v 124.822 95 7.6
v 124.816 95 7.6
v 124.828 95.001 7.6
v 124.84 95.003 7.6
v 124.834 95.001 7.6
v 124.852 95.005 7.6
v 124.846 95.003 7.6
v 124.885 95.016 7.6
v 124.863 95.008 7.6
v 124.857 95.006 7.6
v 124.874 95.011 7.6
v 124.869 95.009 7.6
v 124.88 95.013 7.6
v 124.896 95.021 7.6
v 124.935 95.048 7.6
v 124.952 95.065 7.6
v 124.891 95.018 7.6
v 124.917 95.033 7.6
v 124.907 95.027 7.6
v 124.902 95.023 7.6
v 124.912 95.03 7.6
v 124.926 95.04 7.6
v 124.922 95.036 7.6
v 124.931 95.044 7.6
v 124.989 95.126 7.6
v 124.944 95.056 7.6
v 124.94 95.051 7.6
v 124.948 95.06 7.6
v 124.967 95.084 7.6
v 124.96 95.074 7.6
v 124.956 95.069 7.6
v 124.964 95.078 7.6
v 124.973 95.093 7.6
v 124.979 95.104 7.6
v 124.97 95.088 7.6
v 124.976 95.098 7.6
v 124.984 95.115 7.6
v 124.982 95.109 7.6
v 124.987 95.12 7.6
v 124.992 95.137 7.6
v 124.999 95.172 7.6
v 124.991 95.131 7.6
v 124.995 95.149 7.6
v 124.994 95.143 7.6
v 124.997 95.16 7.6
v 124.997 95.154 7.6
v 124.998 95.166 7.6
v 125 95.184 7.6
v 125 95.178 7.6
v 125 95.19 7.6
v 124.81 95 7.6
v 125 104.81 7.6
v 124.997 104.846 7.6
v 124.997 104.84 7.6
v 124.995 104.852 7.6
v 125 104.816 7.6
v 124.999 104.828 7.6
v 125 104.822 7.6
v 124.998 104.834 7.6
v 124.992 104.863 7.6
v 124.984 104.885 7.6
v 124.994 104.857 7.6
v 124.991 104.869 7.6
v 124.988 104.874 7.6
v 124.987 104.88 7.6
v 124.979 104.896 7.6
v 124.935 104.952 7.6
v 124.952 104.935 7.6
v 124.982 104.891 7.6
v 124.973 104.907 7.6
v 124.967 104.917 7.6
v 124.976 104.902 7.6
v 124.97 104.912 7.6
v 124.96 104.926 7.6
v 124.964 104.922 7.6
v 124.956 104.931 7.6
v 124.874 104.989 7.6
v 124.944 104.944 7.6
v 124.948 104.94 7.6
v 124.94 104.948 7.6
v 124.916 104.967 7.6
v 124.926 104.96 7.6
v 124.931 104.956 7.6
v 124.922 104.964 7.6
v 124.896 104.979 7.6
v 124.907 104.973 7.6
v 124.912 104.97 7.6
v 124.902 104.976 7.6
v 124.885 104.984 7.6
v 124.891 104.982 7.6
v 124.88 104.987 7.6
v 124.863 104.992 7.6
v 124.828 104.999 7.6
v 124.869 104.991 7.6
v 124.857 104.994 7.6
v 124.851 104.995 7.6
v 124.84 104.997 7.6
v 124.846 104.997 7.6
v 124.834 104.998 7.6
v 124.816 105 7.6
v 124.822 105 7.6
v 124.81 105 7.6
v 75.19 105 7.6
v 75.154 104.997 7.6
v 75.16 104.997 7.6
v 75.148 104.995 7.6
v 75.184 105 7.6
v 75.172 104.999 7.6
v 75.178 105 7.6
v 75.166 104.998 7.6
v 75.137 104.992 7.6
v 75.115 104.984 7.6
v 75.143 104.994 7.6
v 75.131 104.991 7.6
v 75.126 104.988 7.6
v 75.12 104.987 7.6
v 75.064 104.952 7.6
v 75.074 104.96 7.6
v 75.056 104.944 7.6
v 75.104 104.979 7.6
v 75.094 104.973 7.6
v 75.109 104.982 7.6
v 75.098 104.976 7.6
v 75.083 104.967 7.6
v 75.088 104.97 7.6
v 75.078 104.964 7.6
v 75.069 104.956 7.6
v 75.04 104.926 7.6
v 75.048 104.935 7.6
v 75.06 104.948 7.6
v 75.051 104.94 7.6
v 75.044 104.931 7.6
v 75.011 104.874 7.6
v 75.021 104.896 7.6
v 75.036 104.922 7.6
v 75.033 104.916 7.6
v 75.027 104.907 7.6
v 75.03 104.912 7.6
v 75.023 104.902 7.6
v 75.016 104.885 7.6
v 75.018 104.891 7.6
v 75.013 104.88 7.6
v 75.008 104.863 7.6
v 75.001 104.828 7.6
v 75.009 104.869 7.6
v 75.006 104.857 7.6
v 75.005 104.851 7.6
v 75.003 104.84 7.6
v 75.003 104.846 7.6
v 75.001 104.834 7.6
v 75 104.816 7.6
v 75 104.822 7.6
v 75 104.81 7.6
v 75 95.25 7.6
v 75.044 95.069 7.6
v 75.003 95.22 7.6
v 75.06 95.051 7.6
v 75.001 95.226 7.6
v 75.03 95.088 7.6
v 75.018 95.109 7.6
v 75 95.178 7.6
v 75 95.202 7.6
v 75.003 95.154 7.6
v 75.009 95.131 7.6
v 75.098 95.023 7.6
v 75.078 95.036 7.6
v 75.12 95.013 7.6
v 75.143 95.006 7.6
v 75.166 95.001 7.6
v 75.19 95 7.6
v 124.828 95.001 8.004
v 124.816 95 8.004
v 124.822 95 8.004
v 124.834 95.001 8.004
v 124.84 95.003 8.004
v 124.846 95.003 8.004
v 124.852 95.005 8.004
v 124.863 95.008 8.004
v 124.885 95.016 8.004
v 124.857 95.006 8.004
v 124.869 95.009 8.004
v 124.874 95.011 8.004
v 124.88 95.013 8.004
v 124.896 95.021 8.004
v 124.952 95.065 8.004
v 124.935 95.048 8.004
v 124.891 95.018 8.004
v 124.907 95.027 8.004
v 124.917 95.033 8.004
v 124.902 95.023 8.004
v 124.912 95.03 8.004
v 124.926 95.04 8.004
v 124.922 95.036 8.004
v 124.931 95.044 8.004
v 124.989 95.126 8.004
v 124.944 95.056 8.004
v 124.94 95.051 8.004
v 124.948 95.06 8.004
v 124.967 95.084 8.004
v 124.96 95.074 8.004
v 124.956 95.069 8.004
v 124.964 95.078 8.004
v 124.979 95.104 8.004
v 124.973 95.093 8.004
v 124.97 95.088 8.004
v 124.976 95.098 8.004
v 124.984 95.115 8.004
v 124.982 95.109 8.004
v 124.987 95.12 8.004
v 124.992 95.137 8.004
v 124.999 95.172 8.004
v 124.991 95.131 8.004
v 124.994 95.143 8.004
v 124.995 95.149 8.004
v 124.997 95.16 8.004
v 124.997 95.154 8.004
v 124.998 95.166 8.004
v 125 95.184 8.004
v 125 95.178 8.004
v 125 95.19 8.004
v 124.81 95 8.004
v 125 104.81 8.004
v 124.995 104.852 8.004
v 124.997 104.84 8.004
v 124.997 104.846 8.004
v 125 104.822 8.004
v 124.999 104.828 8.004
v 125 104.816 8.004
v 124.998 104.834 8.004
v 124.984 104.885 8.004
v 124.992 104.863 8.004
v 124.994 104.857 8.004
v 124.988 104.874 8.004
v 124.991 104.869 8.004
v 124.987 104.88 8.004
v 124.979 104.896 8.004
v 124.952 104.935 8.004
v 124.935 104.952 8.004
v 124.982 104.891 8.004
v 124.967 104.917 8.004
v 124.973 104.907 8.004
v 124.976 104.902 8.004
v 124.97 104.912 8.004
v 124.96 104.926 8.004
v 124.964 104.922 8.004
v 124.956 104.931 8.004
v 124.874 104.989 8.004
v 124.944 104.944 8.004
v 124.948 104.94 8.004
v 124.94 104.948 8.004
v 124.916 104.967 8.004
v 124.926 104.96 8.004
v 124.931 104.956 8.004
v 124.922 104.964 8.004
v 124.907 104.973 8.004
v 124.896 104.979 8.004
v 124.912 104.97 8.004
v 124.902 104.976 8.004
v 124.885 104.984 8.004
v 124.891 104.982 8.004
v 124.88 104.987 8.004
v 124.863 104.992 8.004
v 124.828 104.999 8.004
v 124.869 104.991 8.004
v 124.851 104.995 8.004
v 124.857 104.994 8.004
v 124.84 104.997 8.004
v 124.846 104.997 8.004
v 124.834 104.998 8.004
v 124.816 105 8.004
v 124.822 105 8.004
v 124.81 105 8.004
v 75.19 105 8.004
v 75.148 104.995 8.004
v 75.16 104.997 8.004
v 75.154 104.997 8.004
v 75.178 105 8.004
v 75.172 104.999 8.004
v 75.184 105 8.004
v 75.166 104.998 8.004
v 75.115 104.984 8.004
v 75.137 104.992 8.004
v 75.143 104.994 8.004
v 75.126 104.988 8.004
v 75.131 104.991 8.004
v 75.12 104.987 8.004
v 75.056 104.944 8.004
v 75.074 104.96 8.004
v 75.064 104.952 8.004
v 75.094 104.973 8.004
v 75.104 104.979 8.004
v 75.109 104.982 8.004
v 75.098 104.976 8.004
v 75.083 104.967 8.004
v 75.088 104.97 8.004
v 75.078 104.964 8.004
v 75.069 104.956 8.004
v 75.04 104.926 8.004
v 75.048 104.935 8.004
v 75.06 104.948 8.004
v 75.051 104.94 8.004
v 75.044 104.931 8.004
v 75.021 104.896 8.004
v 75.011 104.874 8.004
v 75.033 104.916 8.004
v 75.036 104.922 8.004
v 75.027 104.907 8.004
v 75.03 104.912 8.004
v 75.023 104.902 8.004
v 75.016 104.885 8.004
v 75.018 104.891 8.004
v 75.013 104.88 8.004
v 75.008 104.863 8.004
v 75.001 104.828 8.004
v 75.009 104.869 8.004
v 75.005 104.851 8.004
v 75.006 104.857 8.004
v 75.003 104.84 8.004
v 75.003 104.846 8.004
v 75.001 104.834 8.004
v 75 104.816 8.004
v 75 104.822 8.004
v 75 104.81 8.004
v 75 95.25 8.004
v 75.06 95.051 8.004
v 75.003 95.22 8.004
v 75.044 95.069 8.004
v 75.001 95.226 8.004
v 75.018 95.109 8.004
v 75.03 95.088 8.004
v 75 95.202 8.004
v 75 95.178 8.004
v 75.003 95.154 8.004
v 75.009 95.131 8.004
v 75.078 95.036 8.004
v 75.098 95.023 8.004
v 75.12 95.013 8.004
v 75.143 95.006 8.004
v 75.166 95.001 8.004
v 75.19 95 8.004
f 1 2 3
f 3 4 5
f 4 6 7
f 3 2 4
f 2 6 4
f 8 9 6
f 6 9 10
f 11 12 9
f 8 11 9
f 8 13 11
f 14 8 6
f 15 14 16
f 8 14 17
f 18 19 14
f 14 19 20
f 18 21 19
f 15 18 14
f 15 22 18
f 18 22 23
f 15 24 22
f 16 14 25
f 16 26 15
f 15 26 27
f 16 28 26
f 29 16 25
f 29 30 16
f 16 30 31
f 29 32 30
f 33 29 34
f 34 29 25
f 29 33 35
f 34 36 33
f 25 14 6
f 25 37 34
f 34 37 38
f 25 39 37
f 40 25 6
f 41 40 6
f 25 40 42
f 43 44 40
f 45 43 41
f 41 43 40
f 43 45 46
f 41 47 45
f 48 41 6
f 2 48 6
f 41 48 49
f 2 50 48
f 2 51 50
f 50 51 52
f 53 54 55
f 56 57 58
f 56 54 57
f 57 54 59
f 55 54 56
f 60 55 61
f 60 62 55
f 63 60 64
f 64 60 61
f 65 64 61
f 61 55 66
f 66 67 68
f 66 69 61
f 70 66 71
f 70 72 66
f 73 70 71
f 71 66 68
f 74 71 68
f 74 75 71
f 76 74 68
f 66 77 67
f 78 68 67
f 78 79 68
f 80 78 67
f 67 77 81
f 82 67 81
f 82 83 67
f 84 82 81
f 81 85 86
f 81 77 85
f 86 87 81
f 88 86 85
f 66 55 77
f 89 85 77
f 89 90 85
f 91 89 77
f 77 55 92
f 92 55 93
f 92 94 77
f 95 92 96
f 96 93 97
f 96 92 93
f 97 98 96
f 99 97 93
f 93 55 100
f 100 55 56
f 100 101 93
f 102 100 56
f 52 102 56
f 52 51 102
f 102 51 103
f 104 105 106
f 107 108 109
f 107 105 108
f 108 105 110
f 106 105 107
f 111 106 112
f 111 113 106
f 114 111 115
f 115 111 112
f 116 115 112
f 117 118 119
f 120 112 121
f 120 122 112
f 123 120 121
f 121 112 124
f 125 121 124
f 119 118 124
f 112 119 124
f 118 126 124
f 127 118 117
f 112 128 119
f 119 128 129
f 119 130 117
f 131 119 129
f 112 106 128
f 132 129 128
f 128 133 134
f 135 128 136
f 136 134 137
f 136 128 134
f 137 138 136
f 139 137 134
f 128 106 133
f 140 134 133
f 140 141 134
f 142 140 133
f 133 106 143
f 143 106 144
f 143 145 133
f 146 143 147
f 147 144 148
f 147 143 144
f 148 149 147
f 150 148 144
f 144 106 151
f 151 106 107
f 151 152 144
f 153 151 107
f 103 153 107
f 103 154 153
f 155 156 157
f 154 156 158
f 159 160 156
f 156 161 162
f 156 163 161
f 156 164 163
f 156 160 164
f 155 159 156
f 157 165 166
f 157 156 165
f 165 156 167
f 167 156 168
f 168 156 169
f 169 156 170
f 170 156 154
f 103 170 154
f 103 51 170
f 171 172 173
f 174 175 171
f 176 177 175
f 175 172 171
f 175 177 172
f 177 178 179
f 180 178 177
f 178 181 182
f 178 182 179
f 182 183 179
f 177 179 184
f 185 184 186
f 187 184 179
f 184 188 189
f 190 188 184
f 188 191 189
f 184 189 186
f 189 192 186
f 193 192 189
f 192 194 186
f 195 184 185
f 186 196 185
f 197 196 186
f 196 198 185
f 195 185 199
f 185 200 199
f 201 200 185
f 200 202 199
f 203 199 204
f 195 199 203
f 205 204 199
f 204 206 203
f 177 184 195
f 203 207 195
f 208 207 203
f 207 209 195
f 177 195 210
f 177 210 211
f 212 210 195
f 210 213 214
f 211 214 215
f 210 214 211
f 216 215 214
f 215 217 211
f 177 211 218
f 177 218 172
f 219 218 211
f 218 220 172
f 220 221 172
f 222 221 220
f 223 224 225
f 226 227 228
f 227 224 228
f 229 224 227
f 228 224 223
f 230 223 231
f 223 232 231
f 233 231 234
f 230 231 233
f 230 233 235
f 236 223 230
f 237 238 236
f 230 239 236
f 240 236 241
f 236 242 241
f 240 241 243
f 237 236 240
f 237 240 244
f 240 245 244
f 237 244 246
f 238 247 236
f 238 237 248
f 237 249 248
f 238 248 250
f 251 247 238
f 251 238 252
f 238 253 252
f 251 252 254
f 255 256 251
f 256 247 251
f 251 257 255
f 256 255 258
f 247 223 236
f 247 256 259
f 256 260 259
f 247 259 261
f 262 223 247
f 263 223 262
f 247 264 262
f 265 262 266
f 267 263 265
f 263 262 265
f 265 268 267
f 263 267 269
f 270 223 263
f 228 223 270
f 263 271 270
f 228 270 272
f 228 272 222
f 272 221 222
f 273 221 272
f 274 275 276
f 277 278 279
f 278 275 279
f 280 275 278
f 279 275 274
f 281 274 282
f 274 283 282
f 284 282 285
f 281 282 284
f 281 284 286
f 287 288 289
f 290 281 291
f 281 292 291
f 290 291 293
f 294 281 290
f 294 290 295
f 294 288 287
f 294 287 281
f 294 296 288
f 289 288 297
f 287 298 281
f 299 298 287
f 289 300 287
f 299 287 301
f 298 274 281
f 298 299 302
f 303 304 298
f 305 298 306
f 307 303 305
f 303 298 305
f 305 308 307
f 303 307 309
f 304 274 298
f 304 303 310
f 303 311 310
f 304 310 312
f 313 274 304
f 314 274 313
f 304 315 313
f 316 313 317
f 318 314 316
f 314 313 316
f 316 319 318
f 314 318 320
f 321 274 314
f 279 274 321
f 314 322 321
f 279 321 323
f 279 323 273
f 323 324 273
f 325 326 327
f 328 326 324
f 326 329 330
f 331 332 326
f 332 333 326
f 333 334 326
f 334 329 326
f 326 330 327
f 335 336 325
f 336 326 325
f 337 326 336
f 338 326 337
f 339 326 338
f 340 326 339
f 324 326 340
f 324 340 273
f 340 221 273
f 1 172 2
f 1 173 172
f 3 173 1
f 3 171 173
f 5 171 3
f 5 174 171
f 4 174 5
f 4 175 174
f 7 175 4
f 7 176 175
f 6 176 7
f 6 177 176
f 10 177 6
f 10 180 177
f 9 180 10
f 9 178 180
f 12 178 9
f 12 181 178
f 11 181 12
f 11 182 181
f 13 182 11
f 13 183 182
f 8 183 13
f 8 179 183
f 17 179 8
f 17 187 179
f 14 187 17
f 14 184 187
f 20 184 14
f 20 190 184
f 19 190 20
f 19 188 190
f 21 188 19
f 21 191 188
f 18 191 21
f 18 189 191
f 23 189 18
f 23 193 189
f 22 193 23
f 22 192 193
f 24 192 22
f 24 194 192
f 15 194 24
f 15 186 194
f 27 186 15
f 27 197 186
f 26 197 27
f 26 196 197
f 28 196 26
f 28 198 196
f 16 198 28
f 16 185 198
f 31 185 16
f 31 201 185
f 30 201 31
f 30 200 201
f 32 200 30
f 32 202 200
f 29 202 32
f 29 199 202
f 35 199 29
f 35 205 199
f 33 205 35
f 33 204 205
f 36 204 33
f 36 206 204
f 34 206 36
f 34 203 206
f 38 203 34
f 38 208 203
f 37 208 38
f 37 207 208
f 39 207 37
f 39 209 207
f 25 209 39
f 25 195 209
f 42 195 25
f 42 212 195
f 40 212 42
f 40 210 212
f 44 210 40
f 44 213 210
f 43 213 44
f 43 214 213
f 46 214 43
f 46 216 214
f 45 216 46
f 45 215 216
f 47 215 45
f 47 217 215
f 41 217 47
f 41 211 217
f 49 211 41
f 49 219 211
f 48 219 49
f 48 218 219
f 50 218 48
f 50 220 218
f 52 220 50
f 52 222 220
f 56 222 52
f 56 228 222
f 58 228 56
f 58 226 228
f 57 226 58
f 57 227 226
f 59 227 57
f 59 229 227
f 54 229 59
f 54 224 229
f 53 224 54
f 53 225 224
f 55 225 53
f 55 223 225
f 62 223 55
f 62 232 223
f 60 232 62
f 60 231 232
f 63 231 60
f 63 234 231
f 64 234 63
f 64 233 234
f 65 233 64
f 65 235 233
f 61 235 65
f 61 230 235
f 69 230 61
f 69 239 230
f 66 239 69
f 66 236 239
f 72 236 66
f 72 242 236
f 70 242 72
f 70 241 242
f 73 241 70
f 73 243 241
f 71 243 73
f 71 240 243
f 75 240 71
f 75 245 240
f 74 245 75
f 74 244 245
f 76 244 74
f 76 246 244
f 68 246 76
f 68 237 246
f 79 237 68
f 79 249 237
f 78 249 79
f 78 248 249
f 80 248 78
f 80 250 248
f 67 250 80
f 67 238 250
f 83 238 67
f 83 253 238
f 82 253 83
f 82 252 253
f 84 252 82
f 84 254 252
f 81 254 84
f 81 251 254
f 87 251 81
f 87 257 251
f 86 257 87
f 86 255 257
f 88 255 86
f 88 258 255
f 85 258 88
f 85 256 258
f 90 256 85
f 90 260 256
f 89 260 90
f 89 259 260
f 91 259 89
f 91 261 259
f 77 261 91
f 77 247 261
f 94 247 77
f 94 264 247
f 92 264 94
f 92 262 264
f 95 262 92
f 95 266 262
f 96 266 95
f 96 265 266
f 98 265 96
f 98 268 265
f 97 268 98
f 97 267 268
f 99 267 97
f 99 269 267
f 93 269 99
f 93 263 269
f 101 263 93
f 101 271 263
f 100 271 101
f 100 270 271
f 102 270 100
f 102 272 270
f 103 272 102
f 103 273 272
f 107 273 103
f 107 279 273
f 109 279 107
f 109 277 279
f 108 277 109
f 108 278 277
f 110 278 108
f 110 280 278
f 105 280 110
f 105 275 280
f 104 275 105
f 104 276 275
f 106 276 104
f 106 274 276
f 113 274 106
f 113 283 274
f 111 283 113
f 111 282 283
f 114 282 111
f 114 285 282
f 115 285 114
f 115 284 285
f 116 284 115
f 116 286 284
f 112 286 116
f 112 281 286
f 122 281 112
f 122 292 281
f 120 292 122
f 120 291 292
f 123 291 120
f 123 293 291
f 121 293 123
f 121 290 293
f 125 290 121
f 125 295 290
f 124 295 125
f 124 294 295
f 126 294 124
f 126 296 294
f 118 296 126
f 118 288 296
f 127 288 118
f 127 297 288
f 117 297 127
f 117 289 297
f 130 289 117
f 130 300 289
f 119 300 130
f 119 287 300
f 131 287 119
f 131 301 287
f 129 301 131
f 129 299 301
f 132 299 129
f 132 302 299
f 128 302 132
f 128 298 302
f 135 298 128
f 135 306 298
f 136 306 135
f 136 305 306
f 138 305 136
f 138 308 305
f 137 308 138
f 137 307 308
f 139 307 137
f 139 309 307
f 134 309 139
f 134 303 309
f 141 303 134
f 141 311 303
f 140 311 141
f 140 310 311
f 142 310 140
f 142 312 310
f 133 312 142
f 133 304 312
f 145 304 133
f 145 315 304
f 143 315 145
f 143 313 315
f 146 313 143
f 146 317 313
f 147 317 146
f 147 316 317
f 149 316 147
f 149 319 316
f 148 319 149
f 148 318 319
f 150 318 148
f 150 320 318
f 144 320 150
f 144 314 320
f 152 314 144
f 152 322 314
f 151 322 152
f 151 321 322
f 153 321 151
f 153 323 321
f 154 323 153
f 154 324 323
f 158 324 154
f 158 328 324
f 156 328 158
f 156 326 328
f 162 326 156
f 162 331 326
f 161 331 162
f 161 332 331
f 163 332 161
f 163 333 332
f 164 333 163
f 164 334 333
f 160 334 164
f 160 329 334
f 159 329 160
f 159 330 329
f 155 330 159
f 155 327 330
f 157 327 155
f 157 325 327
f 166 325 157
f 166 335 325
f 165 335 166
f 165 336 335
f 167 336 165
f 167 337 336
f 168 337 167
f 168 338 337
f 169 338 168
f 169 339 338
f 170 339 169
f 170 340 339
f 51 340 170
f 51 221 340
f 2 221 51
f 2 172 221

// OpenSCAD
module drawBasicShape(x1, y1, x2, y2, width)
{
	length = sqrt((x1-x2)*(x1-x2) + (y1-y2)*(y1-y2));
	if (width!=0.0) {
		square(size = [width, length], center = false);
		translate([width/2.0, 0, 0]) circle(d=width);
		translate([width/2.0, length, 0]) circle(d=width);
	}
}

module translateAndRotate(x1, y1, x2, y2, width)
{
	if (width != 0.0) {
		angle = atan((y2-y1)/(x2-x1)) +270;
		if (x2>=x1) {
			translate([x1, y1, 0.0]) rotate([0.0, 0.0, angle]) translate([-width/2.0, 0.0, 0.0]) scale([1.0, 1.0, 1.0]) drawBasicShape(x1, y1, x2, y2, width);
		}
		else {
			translate([x1, y1, 0.0]) rotate([0.0, 0.0, angle+180]) translate([-width/2.0, 0.0, 0.0]) scale([1.0, 1.0, 1.0]) drawBasicShape(x1, y1, x2, y2, width);		}
	}
}

$fn=50;

points18 = [
[75.77800000, 95.77800000, 0.00000000],
[124.22200000, 95.77800000, 0.37999672],
[124.22200000, 104.22200000, 0.37997788],
[75.77800000, 104.22200000, 0.37999548],
[75.77800000, 95.83800000, 0.37998140],
[75.48400000, 95.48400000, 0.00000000],
[124.51600000, 95.48400000, 0.37999746],
[124.51600000, 104.51600000, 0.37998977],
[75.48400000, 104.51600000, 0.37999868],
[75.48400000, 95.54400000, 0.37998644],
[75.19000000, 95.19000000, 0.00000000],
[124.81000000, 95.19000000, 0.38000060],
[124.81000000, 104.81000000, 0.38000021],
[75.19000000, 104.81000000, 0.37999939],
[75.19000000, 95.25000000, 0.38000344],
[75.53600000, 95.39000000, 0.00000000],
[75.94600000, 103.88900000, 0.00000000],
[76.11100000, 104.05400000, 0.37935605],
[76.52800000, 104.05400000, 0.38015610],
[75.94600000, 103.47200000, 0.37989934],
[75.94600000, 103.05500000, 0.38001190],
[76.94500000, 104.05400000, 0.37994651],
[77.36200000, 104.05400000, 0.38015610],
[75.94600000, 102.63800000, 0.37996589],
[75.94600000, 102.22100000, 0.38015610],
[77.77900000, 104.05400000, 0.37999966],
[78.19600000, 104.05400000, 0.38001190],
[75.94600000, 101.80400000, 0.38000201],
[75.94600000, 101.38700000, 0.38015610],
[78.61300000, 104.05400000, 0.38000362],
[79.03000000, 104.05400000, 0.38015610],
[75.94600000, 100.97000000, 0.38001859],
[75.94600000, 100.55300000, 0.38001190],
[79.44700000, 104.05400000, 0.38001785],
[79.86400000, 104.05400000, 0.38015610],
[75.94600000, 100.13600000, 0.38001726],
[75.94600000, 99.71900000, 0.38001190],
[80.28100000, 104.05400000, 0.38003640],
[80.69800000, 104.05400000, 0.38001190],
[75.94600000, 99.30200000, 0.38002534],
[75.94600000, 98.88500000, 0.38001190],
[81.11500000, 104.05400000, 0.38003252],
[81.53300000, 104.05400000, 0.37930814],
[75.94600000, 98.46700000, 0.37997836],
[75.94600000, 98.05000000, 0.38015610],
[81.95000000, 104.05400000, 0.37998072],
[82.36700000, 104.05400000, 0.38001190],
[75.94600000, 97.63300000, 0.37998939],
[75.94600000, 97.21600000, 0.38001190],
[82.78400000, 104.05400000, 0.37999079],
[83.20100000, 104.05400000, 0.38001190],
[75.94600000, 96.79900000, 0.37999789],
[75.94600000, 96.38200000, 0.38001190],
[83.61800000, 104.05400000, 0.37999868],
[84.03500000, 104.05400000, 0.38001190],
[75.95600000, 95.97600000, 0.38000275],
[76.34400000, 95.94600000, 0.37958004],
[84.45200000, 104.05400000, 0.38000229],
[84.86900000, 104.05400000, 0.38001190],
[76.76100000, 95.94600000, 0.38000754],
[77.17800000, 95.94600000, 0.38001190],
[85.28600000, 104.05400000, 0.38000229],
[85.70300000, 104.05400000, 0.38001190],
[77.59500000, 95.94600000, 0.38000754],
[78.01200000, 95.94600000, 0.38001190],
[86.12000000, 104.05400000, 0.38000229],
[86.53700000, 104.05400000, 0.38015610],
[78.42900000, 95.94600000, 0.38000229],
[78.84600000, 95.94600000, 0.38001190],
[86.95400000, 104.05400000, 0.38000754],
[87.37100000, 104.05400000, 0.38001190],
[79.26300000, 95.94600000, 0.38000229],
[79.68000000, 95.94600000, 0.38001190],
[87.78900000, 104.05400000, 0.37998940],
[88.20600000, 104.05400000, 0.38001190],
[80.09700000, 95.94600000, 0.37998415],
[80.51500000, 95.94600000, 0.37945200],
[88.62300000, 104.05400000, 0.38000229],
[89.04000000, 104.05400000, 0.38001190],
[80.93200000, 95.94600000, 0.38000754],
[81.34900000, 95.94600000, 0.38001190],
[89.45700000, 104.05400000, 0.38000229],
[89.87400000, 104.05400000, 0.38001190],
[81.76600000, 95.94600000, 0.38000754],
[82.18300000, 95.94600000, 0.38001190],
[90.29100000, 104.05400000, 0.38000229],
[90.70800000, 104.05400000, 0.38015610],
[82.60000000, 95.94600000, 0.38000229],
[83.01700000, 95.94600000, 0.38001190],
[91.12500000, 104.05400000, 0.38000754],
[91.54200000, 104.05400000, 0.38001190],
[83.43400000, 95.94600000, 0.38000229],
[83.85100000, 95.94600000, 0.38001190],
[91.95900000, 104.05400000, 0.38000754],
[92.37600000, 104.05400000, 0.38001190],
[84.26800000, 95.94600000, 0.38000229],
[84.68500000, 95.94600000, 0.38015610],
[92.79300000, 104.05400000, 0.38000229],
[93.21000000, 104.05400000, 0.38001190],
[85.10200000, 95.94600000, 0.38000754],
[85.51900000, 95.94600000, 0.38001190],
[93.62700000, 104.05400000, 0.38000229],
[94.04400000, 104.05400000, 0.38001190],
[85.93600000, 95.94600000, 0.38000754],
[86.35300000, 95.94600000, 0.38001190],
[94.46200000, 104.05400000, 0.37998415],
[94.87900000, 104.05400000, 0.38015610],
[86.77000000, 95.94600000, 0.37998415],
[87.18800000, 95.94600000, 0.37930814],
[95.29600000, 104.05400000, 0.38000754],
[95.71300000, 104.05400000, 0.38001190],
[87.60500000, 95.94600000, 0.38000229],
[88.02200000, 95.94600000, 0.38001190],
[96.13000000, 104.05400000, 0.38000754],
[96.54700000, 104.05400000, 0.38001190],
[88.43900000, 95.94600000, 0.38000229],
[88.85600000, 95.94600000, 0.38015610],
[96.96400000, 104.05400000, 0.38000229],
[97.38100000, 104.05400000, 0.38001190],
[89.27300000, 95.94600000, 0.38000754],
[89.69000000, 95.94600000, 0.38001190],
[97.79800000, 104.05400000, 0.38000229],
[98.21500000, 104.05400000, 0.38001190],
[90.10700000, 95.94600000, 0.38000754],
[90.52400000, 95.94600000, 0.38001190],
[98.63200000, 104.05400000, 0.38000229],
[99.04900000, 104.05400000, 0.38015610],
[90.94100000, 95.94600000, 0.38000229],
[91.35800000, 95.94600000, 0.38001190],
[99.46600000, 104.05400000, 0.38000754],
[99.88300000, 104.05400000, 0.38001190],
[91.77500000, 95.94600000, 0.38000229],
[92.19200000, 95.94600000, 0.38001190],
[100.30000000, 104.05400000, 0.38000754],
[100.71800000, 104.05400000, 0.37930814],
[92.60900000, 95.94600000, 0.37998415],
[93.02600000, 95.94600000, 0.38015610],
[101.13500000, 104.05400000, 0.37998415],
[101.55200000, 104.05400000, 0.38001190],
[93.44400000, 95.94600000, 0.38000229],
[93.86100000, 95.94600000, 0.38015610],
[101.96900000, 104.05400000, 0.38000229],
[102.38600000, 104.05400000, 0.38001190],
[94.27800000, 95.94600000, 0.38000754],
[94.69500000, 95.94600000, 0.38001190],
[102.80300000, 104.05400000, 0.38000229],
[103.22000000, 104.05400000, 0.38001190],
[95.11200000, 95.94600000, 0.38000754],
[95.52900000, 95.94600000, 0.38001190],
[103.63700000, 104.05400000, 0.38000229],
[104.05400000, 104.05400000, 0.38015610],
[95.94600000, 95.94600000, 0.38000229],
[96.36300000, 95.94600000, 0.38001190],
[104.47100000, 104.05400000, 0.38000754],
[104.88800000, 104.05400000, 0.38001190],
[96.78000000, 95.94600000, 0.38000229],
[97.19700000, 95.94600000, 0.38001190],
[105.30500000, 104.05400000, 0.38000754],
[105.72200000, 104.05400000, 0.38001190],
[97.61400000, 95.94600000, 0.38000229],
[98.03100000, 95.94600000, 0.38015610],
[106.13900000, 104.05400000, 0.38000229],
[106.55600000, 104.05400000, 0.38001190],
[98.44800000, 95.94600000, 0.38000754],
[98.86500000, 95.94600000, 0.38001190],
[106.97300000, 104.05400000, 0.38000229],
[107.39100000, 104.05400000, 0.37930814],
[99.28200000, 95.94600000, 0.37998940],
[99.69900000, 95.94600000, 0.38001190],
[107.80800000, 104.05400000, 0.37998415],
[108.22500000, 104.05400000, 0.38015610],
[100.11700000, 95.94600000, 0.38000229],
[100.53400000, 95.94600000, 0.38001190],
[108.64200000, 104.05400000, 0.38000754],
[109.05900000, 104.05400000, 0.38001190],
[100.95100000, 95.94600000, 0.38000229],
[101.36800000, 95.94600000, 0.38001190],
[109.47600000, 104.05400000, 0.38000754],
[109.89300000, 104.05400000, 0.38001190],
[101.78500000, 95.94600000, 0.38000229],
[102.20200000, 95.94600000, 0.38015610],
[110.31000000, 104.05400000, 0.38000229],
[110.72700000, 104.05400000, 0.38001190],
[102.61900000, 95.94600000, 0.38000754],
[103.03600000, 95.94600000, 0.38001190],
[111.14400000, 104.05400000, 0.38000229],
[111.56100000, 104.05400000, 0.38001190],
[103.45300000, 95.94600000, 0.38000754],
[103.87000000, 95.94600000, 0.38001190],
[111.97800000, 104.05400000, 0.38000229],
[112.39500000, 104.05400000, 0.38015610],
[104.28700000, 95.94600000, 0.38000229],
[104.70400000, 95.94600000, 0.38001190],
[112.81200000, 104.05400000, 0.38000754],
[113.22900000, 104.05400000, 0.38001190],
[105.12100000, 95.94600000, 0.38000229],
[105.53800000, 95.94600000, 0.38001190],
[113.64700000, 104.05400000, 0.37998940],
[114.06400000, 104.05400000, 0.38001190],
[105.95500000, 95.94600000, 0.37998415],
[106.37300000, 95.94600000, 0.37945200],
[114.48100000, 104.05400000, 0.38000229],
[114.89800000, 104.05400000, 0.38001190],
[106.79000000, 95.94600000, 0.38000229],
[107.20700000, 95.94600000, 0.38015610],
[115.31500000, 104.05400000, 0.38000229],
[115.73200000, 104.05400000, 0.38001190],
[107.62400000, 95.94600000, 0.38000754],
[108.04100000, 95.94600000, 0.38001190],
[116.14900000, 104.05400000, 0.38000229],
[116.56600000, 104.05400000, 0.38001190],
[108.45800000, 95.94600000, 0.38000754],
[108.87500000, 95.94600000, 0.38001190],
[116.98300000, 104.05400000, 0.38000229],
[117.40000000, 104.05400000, 0.38015610],
[109.29200000, 95.94600000, 0.38000229],
[109.70900000, 95.94600000, 0.38001190],
[117.81700000, 104.05400000, 0.38000754],
[118.23400000, 104.05400000, 0.38001190],
[110.12600000, 95.94600000, 0.38000229],
[110.54300000, 95.94600000, 0.38001190],
[118.65100000, 104.05400000, 0.38000754],
[119.06800000, 104.05400000, 0.38001190],
[110.96000000, 95.94600000, 0.38000229],
[111.37700000, 95.94600000, 0.38015610],
[119.48500000, 104.05400000, 0.38000229],
[119.90200000, 104.05400000, 0.38001190],
[111.79400000, 95.94600000, 0.38000754],
[112.21100000, 95.94600000, 0.38001190],
[120.32000000, 104.05400000, 0.37998415],
[120.73700000, 104.05400000, 0.38001190],
[112.62900000, 95.94600000, 0.38000754],
[113.04600000, 95.94600000, 0.38001190],
[121.15400000, 104.05400000, 0.38000229],
[121.57100000, 104.05400000, 0.38015610],
[113.46300000, 95.94600000, 0.38000229],
[113.88000000, 95.94600000, 0.38001190],
[121.98800000, 104.05400000, 0.38000754],
[122.40500000, 104.05400000, 0.38001190],
[114.29700000, 95.94600000, 0.38000229],
[114.71400000, 95.94600000, 0.38001190],
[122.82200000, 104.05400000, 0.38000754],
[123.23900000, 104.05400000, 0.38001190],
[115.13100000, 95.94600000, 0.38000229],
[115.54800000, 95.94600000, 0.38015610],
[123.65600000, 104.05400000, 0.38000229],
[124.04400000, 104.02500000, 0.37963728],
[115.96500000, 95.94600000, 0.37998455],
[116.38200000, 95.94600000, 0.38001190],
[124.05400000, 103.61800000, 0.37999868],
[124.05400000, 103.20100000, 0.38015610],
[116.79900000, 95.94600000, 0.37999203],
[117.21600000, 95.94600000, 0.38001190],
[124.05400000, 102.78400000, 0.37999701],
[124.05400000, 102.36700000, 0.38001190],
[117.63300000, 95.94600000, 0.37998939],
[118.05000000, 95.94600000, 0.38001190],
[124.05400000, 101.95000000, 0.37998780],
[124.05400000, 101.53300000, 0.38001190],
[118.46700000, 95.94600000, 0.37998597],
[118.88400000, 95.94600000, 0.38001190],
[124.05400000, 101.11600000, 0.37997562],
[124.05400000, 100.69800000, 0.37930814],
[119.30200000, 95.94600000, 0.38003429],
[119.71900000, 95.94600000, 0.38001190],
[124.05400000, 100.28100000, 0.38003640],
[124.05400000, 99.86400000, 0.38001190],
[120.13600000, 95.94600000, 0.38002811],
[120.55300000, 95.94600000, 0.38001190],
[124.05400000, 99.44700000, 0.38002999],
[124.05400000, 99.03000000, 0.38001190],
[120.97000000, 95.94600000, 0.38001859],
[121.38700000, 95.94600000, 0.38015610],
[124.05400000, 98.61300000, 0.38001957],
[124.05400000, 98.19600000, 0.38001190],
[121.80400000, 95.94600000, 0.38002091],
[122.22100000, 95.94600000, 0.38001190],
[124.05400000, 97.77900000, 0.37999966],
[124.05400000, 97.36200000, 0.38015610],
[122.63800000, 95.94600000, 0.37999592],
[123.05500000, 95.94600000, 0.38001190],
[124.05400000, 96.94500000, 0.37998907],
[124.05400000, 96.52800000, 0.38001190],
[123.47200000, 95.94600000, 0.37997240],
[123.88900000, 95.94600000, 0.38001190],
[124.05400000, 96.11100000, 0.37961375],
];

translate([0.0, 0.0, 7.60000000]) {
	linear_extrude(height = 0.40400000, center = false, convexity = 10, twist = 0) {
		union() {
			for( i=[0:len(points18)-2] ){ 
				x1 = points18[i][0];
				y1 = points18[i][1];
				x2 = points18[i+1][0];
				y2 = points18[i+1][1];
				width = points18[i+1][2];
				translateAndRotate(x1, y1, x2, y2, width);
			}
		}
	}
}
